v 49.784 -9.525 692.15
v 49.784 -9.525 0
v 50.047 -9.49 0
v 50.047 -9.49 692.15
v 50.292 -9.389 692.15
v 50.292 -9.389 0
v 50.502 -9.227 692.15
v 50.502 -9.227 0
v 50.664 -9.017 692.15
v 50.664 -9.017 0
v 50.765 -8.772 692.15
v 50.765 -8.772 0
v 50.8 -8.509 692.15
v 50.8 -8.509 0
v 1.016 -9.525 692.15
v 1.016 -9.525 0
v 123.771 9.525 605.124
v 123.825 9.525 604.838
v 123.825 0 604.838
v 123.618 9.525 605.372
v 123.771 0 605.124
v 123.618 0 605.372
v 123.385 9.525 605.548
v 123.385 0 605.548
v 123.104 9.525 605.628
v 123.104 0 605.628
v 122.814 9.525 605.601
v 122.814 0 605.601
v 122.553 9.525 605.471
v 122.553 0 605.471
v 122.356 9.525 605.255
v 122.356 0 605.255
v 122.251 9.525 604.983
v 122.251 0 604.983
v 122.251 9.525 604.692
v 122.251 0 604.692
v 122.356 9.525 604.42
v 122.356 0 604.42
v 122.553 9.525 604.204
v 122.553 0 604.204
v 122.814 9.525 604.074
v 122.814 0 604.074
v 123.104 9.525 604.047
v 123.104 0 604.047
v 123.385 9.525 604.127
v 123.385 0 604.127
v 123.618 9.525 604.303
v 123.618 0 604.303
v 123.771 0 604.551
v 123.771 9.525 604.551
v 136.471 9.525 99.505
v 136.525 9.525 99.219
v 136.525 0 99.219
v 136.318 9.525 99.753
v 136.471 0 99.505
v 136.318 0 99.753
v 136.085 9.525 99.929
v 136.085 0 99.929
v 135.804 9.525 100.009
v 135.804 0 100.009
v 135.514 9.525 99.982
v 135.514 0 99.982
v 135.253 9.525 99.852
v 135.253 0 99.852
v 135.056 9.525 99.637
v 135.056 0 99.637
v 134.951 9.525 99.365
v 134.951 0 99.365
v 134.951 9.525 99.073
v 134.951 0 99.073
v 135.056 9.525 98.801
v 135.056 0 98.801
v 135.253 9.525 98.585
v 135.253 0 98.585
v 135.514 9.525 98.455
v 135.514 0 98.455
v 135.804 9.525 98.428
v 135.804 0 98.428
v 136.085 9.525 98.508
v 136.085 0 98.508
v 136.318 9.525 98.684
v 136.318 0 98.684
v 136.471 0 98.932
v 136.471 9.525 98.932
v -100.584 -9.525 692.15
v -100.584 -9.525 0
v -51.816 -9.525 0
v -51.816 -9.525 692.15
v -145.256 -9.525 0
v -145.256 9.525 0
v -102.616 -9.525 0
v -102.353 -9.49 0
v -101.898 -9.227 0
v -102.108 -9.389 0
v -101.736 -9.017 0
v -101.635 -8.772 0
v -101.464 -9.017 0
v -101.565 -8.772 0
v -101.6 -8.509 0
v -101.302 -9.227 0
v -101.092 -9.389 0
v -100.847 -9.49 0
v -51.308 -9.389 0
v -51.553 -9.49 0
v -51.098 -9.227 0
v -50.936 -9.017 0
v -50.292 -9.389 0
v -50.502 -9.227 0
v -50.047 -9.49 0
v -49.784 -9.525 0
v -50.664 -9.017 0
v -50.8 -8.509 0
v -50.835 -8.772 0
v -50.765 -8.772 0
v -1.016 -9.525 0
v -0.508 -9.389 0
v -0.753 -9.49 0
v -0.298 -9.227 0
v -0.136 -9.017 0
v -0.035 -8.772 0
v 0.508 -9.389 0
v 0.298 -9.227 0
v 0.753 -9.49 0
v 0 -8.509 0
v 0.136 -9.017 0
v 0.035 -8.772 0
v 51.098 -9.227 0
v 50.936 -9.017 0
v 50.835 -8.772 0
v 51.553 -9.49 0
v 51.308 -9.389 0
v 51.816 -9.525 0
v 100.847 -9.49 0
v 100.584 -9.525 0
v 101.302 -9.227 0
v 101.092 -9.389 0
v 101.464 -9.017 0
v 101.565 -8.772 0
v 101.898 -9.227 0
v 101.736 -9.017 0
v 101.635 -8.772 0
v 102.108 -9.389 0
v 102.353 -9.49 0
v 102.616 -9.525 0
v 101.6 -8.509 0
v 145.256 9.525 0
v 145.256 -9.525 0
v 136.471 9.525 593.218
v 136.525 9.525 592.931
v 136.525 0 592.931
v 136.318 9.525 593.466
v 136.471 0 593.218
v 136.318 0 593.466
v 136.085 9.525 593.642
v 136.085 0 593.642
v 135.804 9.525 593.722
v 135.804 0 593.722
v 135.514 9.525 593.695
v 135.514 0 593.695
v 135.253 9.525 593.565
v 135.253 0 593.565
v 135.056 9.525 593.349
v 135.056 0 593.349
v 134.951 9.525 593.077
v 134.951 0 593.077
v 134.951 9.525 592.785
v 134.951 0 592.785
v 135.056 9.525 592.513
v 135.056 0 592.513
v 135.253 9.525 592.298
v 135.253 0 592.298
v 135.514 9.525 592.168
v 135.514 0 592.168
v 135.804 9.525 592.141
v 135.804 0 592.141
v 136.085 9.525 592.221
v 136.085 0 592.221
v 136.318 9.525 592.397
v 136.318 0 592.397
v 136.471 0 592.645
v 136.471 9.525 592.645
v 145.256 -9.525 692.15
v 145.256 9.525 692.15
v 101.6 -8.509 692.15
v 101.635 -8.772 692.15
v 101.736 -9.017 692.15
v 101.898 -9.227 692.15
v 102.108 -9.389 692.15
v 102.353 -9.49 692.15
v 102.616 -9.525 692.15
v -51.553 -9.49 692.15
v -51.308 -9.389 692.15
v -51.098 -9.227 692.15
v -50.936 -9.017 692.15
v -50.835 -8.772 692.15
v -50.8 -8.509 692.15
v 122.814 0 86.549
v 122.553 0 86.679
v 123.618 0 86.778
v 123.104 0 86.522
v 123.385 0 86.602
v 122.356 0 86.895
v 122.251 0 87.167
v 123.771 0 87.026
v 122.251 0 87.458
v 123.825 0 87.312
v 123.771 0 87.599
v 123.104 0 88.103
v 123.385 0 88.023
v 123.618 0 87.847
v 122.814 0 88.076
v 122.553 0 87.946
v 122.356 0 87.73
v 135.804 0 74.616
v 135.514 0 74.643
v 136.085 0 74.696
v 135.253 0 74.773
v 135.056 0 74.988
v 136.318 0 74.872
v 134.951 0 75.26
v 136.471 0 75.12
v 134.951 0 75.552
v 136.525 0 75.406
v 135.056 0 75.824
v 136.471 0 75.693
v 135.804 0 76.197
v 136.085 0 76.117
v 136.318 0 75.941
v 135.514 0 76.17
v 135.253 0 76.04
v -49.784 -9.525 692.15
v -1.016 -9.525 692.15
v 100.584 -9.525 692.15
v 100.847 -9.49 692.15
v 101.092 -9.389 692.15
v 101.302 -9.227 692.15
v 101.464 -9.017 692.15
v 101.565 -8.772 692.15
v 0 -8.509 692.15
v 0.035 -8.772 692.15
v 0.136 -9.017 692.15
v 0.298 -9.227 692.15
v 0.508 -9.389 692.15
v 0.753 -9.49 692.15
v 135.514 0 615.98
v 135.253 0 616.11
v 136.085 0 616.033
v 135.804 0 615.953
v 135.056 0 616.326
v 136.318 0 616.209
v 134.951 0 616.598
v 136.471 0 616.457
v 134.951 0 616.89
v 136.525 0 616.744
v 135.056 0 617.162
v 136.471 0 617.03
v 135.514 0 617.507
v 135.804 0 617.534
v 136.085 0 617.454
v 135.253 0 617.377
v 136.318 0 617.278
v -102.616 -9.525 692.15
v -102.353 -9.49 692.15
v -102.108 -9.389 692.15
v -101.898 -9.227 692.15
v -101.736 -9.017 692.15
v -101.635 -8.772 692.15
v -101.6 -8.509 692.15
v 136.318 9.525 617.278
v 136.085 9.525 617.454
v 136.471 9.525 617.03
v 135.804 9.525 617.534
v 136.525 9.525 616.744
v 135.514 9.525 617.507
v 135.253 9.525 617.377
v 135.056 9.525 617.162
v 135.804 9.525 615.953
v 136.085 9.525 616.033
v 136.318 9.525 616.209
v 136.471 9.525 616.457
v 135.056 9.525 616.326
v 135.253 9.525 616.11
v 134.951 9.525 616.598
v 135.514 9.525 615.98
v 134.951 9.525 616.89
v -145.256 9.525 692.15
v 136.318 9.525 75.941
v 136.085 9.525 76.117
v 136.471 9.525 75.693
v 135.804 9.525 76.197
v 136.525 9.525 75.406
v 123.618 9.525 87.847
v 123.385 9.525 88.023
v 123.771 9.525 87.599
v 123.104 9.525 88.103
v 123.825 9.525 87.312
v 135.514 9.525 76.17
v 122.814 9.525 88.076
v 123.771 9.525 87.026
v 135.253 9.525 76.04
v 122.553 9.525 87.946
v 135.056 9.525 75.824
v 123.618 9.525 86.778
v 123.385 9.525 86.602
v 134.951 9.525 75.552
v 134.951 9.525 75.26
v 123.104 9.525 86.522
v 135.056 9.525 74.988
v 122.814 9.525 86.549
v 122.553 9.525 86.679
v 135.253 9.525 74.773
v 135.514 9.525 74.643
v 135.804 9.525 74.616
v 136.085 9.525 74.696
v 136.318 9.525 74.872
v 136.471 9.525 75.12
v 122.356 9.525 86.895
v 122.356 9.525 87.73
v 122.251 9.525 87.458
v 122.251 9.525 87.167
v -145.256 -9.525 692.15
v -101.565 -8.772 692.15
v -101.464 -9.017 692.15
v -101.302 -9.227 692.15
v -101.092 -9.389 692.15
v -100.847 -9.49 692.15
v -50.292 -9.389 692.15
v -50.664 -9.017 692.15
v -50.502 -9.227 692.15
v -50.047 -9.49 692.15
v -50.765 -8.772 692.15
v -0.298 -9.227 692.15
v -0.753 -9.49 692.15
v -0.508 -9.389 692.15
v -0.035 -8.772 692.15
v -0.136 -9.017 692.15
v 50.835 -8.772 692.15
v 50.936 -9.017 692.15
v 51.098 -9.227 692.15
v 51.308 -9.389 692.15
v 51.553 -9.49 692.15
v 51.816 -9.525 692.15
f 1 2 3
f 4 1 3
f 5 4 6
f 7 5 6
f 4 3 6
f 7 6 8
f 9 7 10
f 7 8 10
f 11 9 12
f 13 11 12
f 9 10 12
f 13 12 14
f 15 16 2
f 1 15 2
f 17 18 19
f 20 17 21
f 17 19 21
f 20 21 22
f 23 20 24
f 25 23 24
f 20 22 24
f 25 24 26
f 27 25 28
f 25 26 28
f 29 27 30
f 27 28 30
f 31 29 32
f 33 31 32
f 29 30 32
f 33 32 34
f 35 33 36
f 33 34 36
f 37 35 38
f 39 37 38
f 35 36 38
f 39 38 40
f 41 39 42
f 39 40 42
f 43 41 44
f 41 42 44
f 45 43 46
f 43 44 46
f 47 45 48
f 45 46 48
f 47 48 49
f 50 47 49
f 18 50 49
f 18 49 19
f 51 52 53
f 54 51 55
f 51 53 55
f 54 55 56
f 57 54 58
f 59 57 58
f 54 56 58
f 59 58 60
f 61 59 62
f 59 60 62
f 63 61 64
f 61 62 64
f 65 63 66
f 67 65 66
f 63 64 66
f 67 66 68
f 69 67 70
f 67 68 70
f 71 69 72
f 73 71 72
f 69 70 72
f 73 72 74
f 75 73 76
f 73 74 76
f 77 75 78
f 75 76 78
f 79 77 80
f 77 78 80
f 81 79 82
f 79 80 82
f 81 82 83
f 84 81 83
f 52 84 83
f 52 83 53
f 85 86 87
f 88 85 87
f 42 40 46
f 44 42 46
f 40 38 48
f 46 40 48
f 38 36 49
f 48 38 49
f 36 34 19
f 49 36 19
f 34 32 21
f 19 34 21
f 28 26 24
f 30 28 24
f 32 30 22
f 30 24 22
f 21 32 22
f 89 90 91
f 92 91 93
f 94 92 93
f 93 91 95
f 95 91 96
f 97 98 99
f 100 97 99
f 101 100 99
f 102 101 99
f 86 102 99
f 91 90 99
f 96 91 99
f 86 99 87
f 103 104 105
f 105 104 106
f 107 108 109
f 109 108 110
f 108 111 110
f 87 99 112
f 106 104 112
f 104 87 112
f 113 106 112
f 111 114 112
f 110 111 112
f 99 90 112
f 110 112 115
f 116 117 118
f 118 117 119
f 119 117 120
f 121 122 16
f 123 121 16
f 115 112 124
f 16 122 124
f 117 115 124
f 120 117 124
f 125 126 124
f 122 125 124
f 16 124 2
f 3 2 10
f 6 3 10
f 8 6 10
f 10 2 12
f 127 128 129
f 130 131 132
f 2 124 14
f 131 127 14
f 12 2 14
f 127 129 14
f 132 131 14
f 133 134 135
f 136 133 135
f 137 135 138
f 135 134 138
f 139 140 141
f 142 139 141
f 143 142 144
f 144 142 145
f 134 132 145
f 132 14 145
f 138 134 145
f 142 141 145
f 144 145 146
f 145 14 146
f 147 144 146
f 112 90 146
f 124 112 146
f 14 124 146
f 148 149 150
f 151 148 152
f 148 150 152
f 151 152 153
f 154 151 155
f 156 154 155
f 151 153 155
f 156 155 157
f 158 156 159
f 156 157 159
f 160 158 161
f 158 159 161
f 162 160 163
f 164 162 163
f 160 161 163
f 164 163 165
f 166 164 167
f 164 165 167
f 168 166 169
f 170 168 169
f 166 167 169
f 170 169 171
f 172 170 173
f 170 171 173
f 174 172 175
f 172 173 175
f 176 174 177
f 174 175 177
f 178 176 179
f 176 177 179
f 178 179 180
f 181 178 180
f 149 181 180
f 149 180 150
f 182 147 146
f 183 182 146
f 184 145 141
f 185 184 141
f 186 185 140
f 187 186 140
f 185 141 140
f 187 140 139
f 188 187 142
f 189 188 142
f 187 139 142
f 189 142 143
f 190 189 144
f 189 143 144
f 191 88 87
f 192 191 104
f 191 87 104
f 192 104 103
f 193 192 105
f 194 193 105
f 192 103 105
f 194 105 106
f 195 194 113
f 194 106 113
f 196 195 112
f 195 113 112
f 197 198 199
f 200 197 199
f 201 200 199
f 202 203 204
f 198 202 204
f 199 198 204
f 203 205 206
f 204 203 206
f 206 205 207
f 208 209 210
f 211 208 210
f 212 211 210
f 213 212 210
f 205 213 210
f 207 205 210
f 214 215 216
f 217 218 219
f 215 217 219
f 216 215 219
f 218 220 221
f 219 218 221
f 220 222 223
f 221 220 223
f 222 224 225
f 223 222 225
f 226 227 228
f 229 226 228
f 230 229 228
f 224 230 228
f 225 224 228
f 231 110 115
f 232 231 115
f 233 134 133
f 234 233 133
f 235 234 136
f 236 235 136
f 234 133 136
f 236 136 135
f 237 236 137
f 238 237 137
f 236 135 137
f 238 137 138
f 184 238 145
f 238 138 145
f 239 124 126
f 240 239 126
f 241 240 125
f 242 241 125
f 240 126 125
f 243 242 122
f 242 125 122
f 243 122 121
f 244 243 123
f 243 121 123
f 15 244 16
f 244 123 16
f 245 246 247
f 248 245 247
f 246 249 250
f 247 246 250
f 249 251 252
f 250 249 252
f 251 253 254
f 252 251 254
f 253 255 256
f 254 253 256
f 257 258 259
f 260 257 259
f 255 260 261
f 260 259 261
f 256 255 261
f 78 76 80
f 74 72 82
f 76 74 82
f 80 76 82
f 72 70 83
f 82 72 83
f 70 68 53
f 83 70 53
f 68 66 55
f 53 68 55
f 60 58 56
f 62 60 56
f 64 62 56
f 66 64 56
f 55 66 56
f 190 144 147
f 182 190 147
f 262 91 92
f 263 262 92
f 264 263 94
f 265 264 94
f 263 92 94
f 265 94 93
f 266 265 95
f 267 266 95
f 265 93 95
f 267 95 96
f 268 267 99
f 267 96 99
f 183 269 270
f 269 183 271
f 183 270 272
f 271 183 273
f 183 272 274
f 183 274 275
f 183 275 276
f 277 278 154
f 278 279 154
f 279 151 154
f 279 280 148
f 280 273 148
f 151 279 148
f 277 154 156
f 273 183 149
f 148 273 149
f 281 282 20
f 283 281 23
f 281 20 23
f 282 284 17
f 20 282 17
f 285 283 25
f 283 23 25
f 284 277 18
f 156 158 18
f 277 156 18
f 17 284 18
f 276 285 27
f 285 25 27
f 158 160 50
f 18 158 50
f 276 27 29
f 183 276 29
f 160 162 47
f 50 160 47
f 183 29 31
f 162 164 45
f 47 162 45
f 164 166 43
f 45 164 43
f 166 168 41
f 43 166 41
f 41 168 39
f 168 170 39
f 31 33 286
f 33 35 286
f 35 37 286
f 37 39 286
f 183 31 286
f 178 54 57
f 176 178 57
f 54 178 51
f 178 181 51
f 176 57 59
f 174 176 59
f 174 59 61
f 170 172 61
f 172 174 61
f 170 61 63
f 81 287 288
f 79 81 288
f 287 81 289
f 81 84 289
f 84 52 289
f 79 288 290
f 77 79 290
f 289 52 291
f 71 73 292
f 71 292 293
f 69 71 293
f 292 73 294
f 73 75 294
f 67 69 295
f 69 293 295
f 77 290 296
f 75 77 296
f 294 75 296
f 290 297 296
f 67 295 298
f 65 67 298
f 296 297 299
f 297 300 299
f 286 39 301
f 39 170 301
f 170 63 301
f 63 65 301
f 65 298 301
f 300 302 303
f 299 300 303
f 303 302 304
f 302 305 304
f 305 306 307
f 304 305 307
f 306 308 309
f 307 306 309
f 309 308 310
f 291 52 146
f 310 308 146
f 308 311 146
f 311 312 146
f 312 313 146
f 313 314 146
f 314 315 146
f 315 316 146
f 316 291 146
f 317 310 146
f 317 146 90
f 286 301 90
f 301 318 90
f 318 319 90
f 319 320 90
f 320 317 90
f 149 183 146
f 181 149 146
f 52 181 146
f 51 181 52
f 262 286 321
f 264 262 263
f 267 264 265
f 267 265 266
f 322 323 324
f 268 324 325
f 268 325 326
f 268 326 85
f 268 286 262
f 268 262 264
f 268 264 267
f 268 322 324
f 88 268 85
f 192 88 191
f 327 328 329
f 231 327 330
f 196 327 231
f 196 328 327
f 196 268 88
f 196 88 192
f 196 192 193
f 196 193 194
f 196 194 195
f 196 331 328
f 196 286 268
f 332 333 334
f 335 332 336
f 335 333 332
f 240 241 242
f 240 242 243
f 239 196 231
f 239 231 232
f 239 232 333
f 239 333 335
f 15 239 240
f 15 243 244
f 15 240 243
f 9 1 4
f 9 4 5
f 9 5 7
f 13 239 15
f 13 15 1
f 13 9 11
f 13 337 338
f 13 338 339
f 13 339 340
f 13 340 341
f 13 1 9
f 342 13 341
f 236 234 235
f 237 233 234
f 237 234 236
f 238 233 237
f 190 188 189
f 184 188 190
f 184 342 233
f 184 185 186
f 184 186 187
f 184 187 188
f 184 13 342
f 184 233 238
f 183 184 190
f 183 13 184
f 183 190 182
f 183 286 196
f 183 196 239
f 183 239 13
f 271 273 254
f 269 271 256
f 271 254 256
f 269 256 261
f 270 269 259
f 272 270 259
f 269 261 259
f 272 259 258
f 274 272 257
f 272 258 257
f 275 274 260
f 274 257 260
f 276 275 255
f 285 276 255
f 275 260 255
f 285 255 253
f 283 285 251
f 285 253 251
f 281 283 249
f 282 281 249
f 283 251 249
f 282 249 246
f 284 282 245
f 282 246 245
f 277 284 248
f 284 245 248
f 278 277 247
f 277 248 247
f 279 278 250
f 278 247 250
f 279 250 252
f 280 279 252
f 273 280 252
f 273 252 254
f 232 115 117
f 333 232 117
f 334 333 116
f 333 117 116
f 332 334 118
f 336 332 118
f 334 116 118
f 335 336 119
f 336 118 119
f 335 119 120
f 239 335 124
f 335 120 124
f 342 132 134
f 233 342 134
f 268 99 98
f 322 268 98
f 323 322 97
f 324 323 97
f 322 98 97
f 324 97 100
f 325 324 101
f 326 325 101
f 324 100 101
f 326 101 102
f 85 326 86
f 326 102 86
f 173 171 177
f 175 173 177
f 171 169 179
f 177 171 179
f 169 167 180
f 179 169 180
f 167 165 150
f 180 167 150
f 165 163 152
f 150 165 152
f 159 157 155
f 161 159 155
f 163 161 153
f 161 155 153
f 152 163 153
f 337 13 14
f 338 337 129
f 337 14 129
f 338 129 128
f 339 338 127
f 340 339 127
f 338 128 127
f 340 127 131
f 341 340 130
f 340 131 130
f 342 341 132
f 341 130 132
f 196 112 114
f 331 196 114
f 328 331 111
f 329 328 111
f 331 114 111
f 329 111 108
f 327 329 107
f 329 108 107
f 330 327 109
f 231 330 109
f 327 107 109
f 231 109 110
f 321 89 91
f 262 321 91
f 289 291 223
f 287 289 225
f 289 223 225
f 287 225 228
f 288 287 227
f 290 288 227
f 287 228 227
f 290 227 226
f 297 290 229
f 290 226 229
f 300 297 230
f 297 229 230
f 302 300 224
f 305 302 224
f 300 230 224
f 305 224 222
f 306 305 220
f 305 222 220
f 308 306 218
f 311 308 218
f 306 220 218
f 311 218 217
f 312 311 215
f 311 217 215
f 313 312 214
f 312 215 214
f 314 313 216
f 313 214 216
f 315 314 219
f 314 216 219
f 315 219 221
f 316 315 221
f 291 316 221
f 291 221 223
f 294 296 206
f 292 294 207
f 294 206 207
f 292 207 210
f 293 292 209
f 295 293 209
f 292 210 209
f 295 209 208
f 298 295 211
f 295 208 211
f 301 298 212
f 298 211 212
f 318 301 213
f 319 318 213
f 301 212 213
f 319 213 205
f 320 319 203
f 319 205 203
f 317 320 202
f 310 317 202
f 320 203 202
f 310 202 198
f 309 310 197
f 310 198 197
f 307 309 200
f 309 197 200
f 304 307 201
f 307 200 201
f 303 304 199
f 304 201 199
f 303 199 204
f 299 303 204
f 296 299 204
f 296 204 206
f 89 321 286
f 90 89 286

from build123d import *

# Parameters (mm, degrees)
F1_DEPTH = 692.15
F2_W     = 381
F2_H     = 137.227848
F2_H_2   = 195.285798
F3_DEPTH = 1143
F4_R     = 0.79375
F5_DEPTH = 25.4


with BuildPart() as f1:
    # F0 (on Top) → F1 (new body)
    with BuildSketch(Plane.XY):
        with BuildLine():
            Line((458.216, -9.525), (508, -9.525))
            Line((508, -9.525), (508, 9.525))
            Line((508, 9.525), (-508, 9.525))
            Line((-508, 9.525), (-508, -8.509))
            ThreePointArc((-508, -8.509), (-507.70242, -9.22742), (-506.984, -9.525))
            Line((-506.984, -9.525), (-458.216, -9.525))
            ThreePointArc((-458.216, -9.525), (-457.49758, -9.22742), (-457.2, -8.509))
            ThreePointArc((-457.2, -8.509), (-456.90242, -9.22742), (-456.184, -9.525))
            Line((-456.184, -9.525), (-407.416, -9.525))
            ThreePointArc((-407.416, -9.525), (-406.69758, -9.22742), (-406.4, -8.509))
            ThreePointArc((-406.4, -8.509), (-406.10242, -9.22742), (-405.384, -9.525))
            Line((-405.384, -9.525), (-356.616, -9.525))
            ThreePointArc((-356.616, -9.525), (-355.89758, -9.22742), (-355.6, -8.509))
            ThreePointArc((-355.6, -8.509), (-355.30242, -9.22742), (-354.584, -9.525))
            Line((-354.584, -9.525), (-305.816, -9.525))
            ThreePointArc((-305.816, -9.525), (-305.09758, -9.22742), (-304.8, -8.509))
            ThreePointArc((-304.8, -8.509), (-304.50242, -9.22742), (-303.784, -9.525))
            Line((-303.784, -9.525), (-255.016, -9.525))
            ThreePointArc((-255.016, -9.525), (-254.29758, -9.22742), (-254, -8.509))
            ThreePointArc((-254, -8.509), (-253.70242, -9.22742), (-252.984, -9.525))
            Line((-252.984, -9.525), (-204.216, -9.525))
            ThreePointArc((-204.216, -9.525), (-203.49758, -9.22742), (-203.2, -8.509))
            ThreePointArc((-203.2, -8.509), (-202.90242, -9.22742), (-202.184, -9.525))
            Line((-202.184, -9.525), (-153.416, -9.525))
            ThreePointArc((-153.416, -9.525), (-152.69758, -9.22742), (-152.4, -8.509))
            ThreePointArc((-152.4, -8.509), (-152.10242, -9.22742), (-151.384, -9.525))
            Line((-151.384, -9.525), (-102.616, -9.525))
            ThreePointArc((-102.616, -9.525), (-101.89758, -9.22742), (-101.6, -8.509))
            ThreePointArc((-101.6, -8.509), (-101.30242, -9.22742), (-100.584, -9.525))
            Line((-100.584, -9.525), (-51.816, -9.525))
            ThreePointArc((-51.816, -9.525), (-51.09758, -9.22742), (-50.8, -8.509))
            ThreePointArc((-50.8, -8.509), (-50.50242, -9.22742), (-49.784, -9.525))
            Line((-49.784, -9.525), (-1.016, -9.525))
            ThreePointArc((-1.016, -9.525), (-0.29758, -9.22742), (0, -8.509))
            ThreePointArc((0, -8.509), (0.29758, -9.22742), (1.016, -9.525))
            Line((1.016, -9.525), (49.784, -9.525))
            ThreePointArc((49.784, -9.525), (50.50242, -9.22742), (50.8, -8.509))
            ThreePointArc((50.8, -8.509), (51.09758, -9.22742), (51.816, -9.525))
            Line((51.816, -9.525), (100.584, -9.525))
            ThreePointArc((100.584, -9.525), (101.30242, -9.22742), (101.6, -8.509))
            ThreePointArc((101.6, -8.509), (101.89758, -9.22742), (102.616, -9.525))
            Line((102.616, -9.525), (151.384, -9.525))
            ThreePointArc((151.384, -9.525), (152.10242, -9.22742), (152.4, -8.509))
            ThreePointArc((152.4, -8.509), (152.69758, -9.22742), (153.416, -9.525))
            Line((153.416, -9.525), (202.184, -9.525))
            ThreePointArc((202.184, -9.525), (202.90242, -9.22742), (203.2, -8.509))
            ThreePointArc((203.2, -8.509), (203.49758, -9.22742), (204.216, -9.525))
            Line((204.216, -9.525), (252.984, -9.525))
            ThreePointArc((252.984, -9.525), (253.70242, -9.22742), (254, -8.509))
            ThreePointArc((254, -8.509), (254.29758, -9.22742), (255.016, -9.525))
            Line((255.016, -9.525), (303.784, -9.525))
            ThreePointArc((303.784, -9.525), (304.50242, -9.22742), (304.8, -8.509))
            ThreePointArc((304.8, -8.509), (305.09758, -9.22742), (305.816, -9.525))
            Line((305.816, -9.525), (354.584, -9.525))
            ThreePointArc((354.584, -9.525), (355.30242, -9.22742), (355.6, -8.509))
            ThreePointArc((355.6, -8.509), (355.89758, -9.22742), (356.616, -9.525))
            Line((356.616, -9.525), (405.384, -9.525))
            ThreePointArc((405.384, -9.525), (406.10242, -9.22742), (406.4, -8.509))
            ThreePointArc((406.4, -8.509), (406.69758, -9.22742), (407.416, -9.525))
            Line((407.416, -9.525), (456.184, -9.525))
            ThreePointArc((456.184, -9.525), (456.90242, -9.22742), (457.2, -8.509))
            ThreePointArc((457.2, -8.509), (457.49758, -9.22742), (458.216, -9.525))
        make_face()
        with BuildLine():
            ThreePointArc((-506.984, -9.525), (-507.70242, -9.22742), (-508, -8.509))
            Line((-508, -8.509), (-508, -9.525))
            Line((-508, -9.525), (-506.984, -9.525))
        make_face()
    extrude(amount=F1_DEPTH)

    # F2 (on Top) → F3 (cut)
    with BuildSketch(Plane.XY):
        with Locations((335.75625, -20.971623)):
            Rectangle(F2_W, F2_H)
        with Locations((-335.75625, -39.444607)):
            Rectangle(F2_W, F2_H_2)
    extrude(amount=F3_DEPTH, mode=Mode.SUBTRACT)

    # F4 (on Front) → F5 (cut)
    with BuildSketch(Plane.XZ):
        with Locations((135.73125, 616.74375)):
            Circle(F4_R)
        with Locations((123.03125, 604.8375)):
            Circle(F4_R)
        with Locations((135.73125, 592.93125)):
            Circle(F4_R)
        with Locations((135.73125, 99.21875)):
            Circle(F4_R)
        with Locations((123.03125, 87.3125)):
            Circle(F4_R)
        with Locations((135.73125, 75.40625)):
            Circle(F4_R)
    extrude(amount=-F5_DEPTH, mode=Mode.SUBTRACT)


solid = f1.part
